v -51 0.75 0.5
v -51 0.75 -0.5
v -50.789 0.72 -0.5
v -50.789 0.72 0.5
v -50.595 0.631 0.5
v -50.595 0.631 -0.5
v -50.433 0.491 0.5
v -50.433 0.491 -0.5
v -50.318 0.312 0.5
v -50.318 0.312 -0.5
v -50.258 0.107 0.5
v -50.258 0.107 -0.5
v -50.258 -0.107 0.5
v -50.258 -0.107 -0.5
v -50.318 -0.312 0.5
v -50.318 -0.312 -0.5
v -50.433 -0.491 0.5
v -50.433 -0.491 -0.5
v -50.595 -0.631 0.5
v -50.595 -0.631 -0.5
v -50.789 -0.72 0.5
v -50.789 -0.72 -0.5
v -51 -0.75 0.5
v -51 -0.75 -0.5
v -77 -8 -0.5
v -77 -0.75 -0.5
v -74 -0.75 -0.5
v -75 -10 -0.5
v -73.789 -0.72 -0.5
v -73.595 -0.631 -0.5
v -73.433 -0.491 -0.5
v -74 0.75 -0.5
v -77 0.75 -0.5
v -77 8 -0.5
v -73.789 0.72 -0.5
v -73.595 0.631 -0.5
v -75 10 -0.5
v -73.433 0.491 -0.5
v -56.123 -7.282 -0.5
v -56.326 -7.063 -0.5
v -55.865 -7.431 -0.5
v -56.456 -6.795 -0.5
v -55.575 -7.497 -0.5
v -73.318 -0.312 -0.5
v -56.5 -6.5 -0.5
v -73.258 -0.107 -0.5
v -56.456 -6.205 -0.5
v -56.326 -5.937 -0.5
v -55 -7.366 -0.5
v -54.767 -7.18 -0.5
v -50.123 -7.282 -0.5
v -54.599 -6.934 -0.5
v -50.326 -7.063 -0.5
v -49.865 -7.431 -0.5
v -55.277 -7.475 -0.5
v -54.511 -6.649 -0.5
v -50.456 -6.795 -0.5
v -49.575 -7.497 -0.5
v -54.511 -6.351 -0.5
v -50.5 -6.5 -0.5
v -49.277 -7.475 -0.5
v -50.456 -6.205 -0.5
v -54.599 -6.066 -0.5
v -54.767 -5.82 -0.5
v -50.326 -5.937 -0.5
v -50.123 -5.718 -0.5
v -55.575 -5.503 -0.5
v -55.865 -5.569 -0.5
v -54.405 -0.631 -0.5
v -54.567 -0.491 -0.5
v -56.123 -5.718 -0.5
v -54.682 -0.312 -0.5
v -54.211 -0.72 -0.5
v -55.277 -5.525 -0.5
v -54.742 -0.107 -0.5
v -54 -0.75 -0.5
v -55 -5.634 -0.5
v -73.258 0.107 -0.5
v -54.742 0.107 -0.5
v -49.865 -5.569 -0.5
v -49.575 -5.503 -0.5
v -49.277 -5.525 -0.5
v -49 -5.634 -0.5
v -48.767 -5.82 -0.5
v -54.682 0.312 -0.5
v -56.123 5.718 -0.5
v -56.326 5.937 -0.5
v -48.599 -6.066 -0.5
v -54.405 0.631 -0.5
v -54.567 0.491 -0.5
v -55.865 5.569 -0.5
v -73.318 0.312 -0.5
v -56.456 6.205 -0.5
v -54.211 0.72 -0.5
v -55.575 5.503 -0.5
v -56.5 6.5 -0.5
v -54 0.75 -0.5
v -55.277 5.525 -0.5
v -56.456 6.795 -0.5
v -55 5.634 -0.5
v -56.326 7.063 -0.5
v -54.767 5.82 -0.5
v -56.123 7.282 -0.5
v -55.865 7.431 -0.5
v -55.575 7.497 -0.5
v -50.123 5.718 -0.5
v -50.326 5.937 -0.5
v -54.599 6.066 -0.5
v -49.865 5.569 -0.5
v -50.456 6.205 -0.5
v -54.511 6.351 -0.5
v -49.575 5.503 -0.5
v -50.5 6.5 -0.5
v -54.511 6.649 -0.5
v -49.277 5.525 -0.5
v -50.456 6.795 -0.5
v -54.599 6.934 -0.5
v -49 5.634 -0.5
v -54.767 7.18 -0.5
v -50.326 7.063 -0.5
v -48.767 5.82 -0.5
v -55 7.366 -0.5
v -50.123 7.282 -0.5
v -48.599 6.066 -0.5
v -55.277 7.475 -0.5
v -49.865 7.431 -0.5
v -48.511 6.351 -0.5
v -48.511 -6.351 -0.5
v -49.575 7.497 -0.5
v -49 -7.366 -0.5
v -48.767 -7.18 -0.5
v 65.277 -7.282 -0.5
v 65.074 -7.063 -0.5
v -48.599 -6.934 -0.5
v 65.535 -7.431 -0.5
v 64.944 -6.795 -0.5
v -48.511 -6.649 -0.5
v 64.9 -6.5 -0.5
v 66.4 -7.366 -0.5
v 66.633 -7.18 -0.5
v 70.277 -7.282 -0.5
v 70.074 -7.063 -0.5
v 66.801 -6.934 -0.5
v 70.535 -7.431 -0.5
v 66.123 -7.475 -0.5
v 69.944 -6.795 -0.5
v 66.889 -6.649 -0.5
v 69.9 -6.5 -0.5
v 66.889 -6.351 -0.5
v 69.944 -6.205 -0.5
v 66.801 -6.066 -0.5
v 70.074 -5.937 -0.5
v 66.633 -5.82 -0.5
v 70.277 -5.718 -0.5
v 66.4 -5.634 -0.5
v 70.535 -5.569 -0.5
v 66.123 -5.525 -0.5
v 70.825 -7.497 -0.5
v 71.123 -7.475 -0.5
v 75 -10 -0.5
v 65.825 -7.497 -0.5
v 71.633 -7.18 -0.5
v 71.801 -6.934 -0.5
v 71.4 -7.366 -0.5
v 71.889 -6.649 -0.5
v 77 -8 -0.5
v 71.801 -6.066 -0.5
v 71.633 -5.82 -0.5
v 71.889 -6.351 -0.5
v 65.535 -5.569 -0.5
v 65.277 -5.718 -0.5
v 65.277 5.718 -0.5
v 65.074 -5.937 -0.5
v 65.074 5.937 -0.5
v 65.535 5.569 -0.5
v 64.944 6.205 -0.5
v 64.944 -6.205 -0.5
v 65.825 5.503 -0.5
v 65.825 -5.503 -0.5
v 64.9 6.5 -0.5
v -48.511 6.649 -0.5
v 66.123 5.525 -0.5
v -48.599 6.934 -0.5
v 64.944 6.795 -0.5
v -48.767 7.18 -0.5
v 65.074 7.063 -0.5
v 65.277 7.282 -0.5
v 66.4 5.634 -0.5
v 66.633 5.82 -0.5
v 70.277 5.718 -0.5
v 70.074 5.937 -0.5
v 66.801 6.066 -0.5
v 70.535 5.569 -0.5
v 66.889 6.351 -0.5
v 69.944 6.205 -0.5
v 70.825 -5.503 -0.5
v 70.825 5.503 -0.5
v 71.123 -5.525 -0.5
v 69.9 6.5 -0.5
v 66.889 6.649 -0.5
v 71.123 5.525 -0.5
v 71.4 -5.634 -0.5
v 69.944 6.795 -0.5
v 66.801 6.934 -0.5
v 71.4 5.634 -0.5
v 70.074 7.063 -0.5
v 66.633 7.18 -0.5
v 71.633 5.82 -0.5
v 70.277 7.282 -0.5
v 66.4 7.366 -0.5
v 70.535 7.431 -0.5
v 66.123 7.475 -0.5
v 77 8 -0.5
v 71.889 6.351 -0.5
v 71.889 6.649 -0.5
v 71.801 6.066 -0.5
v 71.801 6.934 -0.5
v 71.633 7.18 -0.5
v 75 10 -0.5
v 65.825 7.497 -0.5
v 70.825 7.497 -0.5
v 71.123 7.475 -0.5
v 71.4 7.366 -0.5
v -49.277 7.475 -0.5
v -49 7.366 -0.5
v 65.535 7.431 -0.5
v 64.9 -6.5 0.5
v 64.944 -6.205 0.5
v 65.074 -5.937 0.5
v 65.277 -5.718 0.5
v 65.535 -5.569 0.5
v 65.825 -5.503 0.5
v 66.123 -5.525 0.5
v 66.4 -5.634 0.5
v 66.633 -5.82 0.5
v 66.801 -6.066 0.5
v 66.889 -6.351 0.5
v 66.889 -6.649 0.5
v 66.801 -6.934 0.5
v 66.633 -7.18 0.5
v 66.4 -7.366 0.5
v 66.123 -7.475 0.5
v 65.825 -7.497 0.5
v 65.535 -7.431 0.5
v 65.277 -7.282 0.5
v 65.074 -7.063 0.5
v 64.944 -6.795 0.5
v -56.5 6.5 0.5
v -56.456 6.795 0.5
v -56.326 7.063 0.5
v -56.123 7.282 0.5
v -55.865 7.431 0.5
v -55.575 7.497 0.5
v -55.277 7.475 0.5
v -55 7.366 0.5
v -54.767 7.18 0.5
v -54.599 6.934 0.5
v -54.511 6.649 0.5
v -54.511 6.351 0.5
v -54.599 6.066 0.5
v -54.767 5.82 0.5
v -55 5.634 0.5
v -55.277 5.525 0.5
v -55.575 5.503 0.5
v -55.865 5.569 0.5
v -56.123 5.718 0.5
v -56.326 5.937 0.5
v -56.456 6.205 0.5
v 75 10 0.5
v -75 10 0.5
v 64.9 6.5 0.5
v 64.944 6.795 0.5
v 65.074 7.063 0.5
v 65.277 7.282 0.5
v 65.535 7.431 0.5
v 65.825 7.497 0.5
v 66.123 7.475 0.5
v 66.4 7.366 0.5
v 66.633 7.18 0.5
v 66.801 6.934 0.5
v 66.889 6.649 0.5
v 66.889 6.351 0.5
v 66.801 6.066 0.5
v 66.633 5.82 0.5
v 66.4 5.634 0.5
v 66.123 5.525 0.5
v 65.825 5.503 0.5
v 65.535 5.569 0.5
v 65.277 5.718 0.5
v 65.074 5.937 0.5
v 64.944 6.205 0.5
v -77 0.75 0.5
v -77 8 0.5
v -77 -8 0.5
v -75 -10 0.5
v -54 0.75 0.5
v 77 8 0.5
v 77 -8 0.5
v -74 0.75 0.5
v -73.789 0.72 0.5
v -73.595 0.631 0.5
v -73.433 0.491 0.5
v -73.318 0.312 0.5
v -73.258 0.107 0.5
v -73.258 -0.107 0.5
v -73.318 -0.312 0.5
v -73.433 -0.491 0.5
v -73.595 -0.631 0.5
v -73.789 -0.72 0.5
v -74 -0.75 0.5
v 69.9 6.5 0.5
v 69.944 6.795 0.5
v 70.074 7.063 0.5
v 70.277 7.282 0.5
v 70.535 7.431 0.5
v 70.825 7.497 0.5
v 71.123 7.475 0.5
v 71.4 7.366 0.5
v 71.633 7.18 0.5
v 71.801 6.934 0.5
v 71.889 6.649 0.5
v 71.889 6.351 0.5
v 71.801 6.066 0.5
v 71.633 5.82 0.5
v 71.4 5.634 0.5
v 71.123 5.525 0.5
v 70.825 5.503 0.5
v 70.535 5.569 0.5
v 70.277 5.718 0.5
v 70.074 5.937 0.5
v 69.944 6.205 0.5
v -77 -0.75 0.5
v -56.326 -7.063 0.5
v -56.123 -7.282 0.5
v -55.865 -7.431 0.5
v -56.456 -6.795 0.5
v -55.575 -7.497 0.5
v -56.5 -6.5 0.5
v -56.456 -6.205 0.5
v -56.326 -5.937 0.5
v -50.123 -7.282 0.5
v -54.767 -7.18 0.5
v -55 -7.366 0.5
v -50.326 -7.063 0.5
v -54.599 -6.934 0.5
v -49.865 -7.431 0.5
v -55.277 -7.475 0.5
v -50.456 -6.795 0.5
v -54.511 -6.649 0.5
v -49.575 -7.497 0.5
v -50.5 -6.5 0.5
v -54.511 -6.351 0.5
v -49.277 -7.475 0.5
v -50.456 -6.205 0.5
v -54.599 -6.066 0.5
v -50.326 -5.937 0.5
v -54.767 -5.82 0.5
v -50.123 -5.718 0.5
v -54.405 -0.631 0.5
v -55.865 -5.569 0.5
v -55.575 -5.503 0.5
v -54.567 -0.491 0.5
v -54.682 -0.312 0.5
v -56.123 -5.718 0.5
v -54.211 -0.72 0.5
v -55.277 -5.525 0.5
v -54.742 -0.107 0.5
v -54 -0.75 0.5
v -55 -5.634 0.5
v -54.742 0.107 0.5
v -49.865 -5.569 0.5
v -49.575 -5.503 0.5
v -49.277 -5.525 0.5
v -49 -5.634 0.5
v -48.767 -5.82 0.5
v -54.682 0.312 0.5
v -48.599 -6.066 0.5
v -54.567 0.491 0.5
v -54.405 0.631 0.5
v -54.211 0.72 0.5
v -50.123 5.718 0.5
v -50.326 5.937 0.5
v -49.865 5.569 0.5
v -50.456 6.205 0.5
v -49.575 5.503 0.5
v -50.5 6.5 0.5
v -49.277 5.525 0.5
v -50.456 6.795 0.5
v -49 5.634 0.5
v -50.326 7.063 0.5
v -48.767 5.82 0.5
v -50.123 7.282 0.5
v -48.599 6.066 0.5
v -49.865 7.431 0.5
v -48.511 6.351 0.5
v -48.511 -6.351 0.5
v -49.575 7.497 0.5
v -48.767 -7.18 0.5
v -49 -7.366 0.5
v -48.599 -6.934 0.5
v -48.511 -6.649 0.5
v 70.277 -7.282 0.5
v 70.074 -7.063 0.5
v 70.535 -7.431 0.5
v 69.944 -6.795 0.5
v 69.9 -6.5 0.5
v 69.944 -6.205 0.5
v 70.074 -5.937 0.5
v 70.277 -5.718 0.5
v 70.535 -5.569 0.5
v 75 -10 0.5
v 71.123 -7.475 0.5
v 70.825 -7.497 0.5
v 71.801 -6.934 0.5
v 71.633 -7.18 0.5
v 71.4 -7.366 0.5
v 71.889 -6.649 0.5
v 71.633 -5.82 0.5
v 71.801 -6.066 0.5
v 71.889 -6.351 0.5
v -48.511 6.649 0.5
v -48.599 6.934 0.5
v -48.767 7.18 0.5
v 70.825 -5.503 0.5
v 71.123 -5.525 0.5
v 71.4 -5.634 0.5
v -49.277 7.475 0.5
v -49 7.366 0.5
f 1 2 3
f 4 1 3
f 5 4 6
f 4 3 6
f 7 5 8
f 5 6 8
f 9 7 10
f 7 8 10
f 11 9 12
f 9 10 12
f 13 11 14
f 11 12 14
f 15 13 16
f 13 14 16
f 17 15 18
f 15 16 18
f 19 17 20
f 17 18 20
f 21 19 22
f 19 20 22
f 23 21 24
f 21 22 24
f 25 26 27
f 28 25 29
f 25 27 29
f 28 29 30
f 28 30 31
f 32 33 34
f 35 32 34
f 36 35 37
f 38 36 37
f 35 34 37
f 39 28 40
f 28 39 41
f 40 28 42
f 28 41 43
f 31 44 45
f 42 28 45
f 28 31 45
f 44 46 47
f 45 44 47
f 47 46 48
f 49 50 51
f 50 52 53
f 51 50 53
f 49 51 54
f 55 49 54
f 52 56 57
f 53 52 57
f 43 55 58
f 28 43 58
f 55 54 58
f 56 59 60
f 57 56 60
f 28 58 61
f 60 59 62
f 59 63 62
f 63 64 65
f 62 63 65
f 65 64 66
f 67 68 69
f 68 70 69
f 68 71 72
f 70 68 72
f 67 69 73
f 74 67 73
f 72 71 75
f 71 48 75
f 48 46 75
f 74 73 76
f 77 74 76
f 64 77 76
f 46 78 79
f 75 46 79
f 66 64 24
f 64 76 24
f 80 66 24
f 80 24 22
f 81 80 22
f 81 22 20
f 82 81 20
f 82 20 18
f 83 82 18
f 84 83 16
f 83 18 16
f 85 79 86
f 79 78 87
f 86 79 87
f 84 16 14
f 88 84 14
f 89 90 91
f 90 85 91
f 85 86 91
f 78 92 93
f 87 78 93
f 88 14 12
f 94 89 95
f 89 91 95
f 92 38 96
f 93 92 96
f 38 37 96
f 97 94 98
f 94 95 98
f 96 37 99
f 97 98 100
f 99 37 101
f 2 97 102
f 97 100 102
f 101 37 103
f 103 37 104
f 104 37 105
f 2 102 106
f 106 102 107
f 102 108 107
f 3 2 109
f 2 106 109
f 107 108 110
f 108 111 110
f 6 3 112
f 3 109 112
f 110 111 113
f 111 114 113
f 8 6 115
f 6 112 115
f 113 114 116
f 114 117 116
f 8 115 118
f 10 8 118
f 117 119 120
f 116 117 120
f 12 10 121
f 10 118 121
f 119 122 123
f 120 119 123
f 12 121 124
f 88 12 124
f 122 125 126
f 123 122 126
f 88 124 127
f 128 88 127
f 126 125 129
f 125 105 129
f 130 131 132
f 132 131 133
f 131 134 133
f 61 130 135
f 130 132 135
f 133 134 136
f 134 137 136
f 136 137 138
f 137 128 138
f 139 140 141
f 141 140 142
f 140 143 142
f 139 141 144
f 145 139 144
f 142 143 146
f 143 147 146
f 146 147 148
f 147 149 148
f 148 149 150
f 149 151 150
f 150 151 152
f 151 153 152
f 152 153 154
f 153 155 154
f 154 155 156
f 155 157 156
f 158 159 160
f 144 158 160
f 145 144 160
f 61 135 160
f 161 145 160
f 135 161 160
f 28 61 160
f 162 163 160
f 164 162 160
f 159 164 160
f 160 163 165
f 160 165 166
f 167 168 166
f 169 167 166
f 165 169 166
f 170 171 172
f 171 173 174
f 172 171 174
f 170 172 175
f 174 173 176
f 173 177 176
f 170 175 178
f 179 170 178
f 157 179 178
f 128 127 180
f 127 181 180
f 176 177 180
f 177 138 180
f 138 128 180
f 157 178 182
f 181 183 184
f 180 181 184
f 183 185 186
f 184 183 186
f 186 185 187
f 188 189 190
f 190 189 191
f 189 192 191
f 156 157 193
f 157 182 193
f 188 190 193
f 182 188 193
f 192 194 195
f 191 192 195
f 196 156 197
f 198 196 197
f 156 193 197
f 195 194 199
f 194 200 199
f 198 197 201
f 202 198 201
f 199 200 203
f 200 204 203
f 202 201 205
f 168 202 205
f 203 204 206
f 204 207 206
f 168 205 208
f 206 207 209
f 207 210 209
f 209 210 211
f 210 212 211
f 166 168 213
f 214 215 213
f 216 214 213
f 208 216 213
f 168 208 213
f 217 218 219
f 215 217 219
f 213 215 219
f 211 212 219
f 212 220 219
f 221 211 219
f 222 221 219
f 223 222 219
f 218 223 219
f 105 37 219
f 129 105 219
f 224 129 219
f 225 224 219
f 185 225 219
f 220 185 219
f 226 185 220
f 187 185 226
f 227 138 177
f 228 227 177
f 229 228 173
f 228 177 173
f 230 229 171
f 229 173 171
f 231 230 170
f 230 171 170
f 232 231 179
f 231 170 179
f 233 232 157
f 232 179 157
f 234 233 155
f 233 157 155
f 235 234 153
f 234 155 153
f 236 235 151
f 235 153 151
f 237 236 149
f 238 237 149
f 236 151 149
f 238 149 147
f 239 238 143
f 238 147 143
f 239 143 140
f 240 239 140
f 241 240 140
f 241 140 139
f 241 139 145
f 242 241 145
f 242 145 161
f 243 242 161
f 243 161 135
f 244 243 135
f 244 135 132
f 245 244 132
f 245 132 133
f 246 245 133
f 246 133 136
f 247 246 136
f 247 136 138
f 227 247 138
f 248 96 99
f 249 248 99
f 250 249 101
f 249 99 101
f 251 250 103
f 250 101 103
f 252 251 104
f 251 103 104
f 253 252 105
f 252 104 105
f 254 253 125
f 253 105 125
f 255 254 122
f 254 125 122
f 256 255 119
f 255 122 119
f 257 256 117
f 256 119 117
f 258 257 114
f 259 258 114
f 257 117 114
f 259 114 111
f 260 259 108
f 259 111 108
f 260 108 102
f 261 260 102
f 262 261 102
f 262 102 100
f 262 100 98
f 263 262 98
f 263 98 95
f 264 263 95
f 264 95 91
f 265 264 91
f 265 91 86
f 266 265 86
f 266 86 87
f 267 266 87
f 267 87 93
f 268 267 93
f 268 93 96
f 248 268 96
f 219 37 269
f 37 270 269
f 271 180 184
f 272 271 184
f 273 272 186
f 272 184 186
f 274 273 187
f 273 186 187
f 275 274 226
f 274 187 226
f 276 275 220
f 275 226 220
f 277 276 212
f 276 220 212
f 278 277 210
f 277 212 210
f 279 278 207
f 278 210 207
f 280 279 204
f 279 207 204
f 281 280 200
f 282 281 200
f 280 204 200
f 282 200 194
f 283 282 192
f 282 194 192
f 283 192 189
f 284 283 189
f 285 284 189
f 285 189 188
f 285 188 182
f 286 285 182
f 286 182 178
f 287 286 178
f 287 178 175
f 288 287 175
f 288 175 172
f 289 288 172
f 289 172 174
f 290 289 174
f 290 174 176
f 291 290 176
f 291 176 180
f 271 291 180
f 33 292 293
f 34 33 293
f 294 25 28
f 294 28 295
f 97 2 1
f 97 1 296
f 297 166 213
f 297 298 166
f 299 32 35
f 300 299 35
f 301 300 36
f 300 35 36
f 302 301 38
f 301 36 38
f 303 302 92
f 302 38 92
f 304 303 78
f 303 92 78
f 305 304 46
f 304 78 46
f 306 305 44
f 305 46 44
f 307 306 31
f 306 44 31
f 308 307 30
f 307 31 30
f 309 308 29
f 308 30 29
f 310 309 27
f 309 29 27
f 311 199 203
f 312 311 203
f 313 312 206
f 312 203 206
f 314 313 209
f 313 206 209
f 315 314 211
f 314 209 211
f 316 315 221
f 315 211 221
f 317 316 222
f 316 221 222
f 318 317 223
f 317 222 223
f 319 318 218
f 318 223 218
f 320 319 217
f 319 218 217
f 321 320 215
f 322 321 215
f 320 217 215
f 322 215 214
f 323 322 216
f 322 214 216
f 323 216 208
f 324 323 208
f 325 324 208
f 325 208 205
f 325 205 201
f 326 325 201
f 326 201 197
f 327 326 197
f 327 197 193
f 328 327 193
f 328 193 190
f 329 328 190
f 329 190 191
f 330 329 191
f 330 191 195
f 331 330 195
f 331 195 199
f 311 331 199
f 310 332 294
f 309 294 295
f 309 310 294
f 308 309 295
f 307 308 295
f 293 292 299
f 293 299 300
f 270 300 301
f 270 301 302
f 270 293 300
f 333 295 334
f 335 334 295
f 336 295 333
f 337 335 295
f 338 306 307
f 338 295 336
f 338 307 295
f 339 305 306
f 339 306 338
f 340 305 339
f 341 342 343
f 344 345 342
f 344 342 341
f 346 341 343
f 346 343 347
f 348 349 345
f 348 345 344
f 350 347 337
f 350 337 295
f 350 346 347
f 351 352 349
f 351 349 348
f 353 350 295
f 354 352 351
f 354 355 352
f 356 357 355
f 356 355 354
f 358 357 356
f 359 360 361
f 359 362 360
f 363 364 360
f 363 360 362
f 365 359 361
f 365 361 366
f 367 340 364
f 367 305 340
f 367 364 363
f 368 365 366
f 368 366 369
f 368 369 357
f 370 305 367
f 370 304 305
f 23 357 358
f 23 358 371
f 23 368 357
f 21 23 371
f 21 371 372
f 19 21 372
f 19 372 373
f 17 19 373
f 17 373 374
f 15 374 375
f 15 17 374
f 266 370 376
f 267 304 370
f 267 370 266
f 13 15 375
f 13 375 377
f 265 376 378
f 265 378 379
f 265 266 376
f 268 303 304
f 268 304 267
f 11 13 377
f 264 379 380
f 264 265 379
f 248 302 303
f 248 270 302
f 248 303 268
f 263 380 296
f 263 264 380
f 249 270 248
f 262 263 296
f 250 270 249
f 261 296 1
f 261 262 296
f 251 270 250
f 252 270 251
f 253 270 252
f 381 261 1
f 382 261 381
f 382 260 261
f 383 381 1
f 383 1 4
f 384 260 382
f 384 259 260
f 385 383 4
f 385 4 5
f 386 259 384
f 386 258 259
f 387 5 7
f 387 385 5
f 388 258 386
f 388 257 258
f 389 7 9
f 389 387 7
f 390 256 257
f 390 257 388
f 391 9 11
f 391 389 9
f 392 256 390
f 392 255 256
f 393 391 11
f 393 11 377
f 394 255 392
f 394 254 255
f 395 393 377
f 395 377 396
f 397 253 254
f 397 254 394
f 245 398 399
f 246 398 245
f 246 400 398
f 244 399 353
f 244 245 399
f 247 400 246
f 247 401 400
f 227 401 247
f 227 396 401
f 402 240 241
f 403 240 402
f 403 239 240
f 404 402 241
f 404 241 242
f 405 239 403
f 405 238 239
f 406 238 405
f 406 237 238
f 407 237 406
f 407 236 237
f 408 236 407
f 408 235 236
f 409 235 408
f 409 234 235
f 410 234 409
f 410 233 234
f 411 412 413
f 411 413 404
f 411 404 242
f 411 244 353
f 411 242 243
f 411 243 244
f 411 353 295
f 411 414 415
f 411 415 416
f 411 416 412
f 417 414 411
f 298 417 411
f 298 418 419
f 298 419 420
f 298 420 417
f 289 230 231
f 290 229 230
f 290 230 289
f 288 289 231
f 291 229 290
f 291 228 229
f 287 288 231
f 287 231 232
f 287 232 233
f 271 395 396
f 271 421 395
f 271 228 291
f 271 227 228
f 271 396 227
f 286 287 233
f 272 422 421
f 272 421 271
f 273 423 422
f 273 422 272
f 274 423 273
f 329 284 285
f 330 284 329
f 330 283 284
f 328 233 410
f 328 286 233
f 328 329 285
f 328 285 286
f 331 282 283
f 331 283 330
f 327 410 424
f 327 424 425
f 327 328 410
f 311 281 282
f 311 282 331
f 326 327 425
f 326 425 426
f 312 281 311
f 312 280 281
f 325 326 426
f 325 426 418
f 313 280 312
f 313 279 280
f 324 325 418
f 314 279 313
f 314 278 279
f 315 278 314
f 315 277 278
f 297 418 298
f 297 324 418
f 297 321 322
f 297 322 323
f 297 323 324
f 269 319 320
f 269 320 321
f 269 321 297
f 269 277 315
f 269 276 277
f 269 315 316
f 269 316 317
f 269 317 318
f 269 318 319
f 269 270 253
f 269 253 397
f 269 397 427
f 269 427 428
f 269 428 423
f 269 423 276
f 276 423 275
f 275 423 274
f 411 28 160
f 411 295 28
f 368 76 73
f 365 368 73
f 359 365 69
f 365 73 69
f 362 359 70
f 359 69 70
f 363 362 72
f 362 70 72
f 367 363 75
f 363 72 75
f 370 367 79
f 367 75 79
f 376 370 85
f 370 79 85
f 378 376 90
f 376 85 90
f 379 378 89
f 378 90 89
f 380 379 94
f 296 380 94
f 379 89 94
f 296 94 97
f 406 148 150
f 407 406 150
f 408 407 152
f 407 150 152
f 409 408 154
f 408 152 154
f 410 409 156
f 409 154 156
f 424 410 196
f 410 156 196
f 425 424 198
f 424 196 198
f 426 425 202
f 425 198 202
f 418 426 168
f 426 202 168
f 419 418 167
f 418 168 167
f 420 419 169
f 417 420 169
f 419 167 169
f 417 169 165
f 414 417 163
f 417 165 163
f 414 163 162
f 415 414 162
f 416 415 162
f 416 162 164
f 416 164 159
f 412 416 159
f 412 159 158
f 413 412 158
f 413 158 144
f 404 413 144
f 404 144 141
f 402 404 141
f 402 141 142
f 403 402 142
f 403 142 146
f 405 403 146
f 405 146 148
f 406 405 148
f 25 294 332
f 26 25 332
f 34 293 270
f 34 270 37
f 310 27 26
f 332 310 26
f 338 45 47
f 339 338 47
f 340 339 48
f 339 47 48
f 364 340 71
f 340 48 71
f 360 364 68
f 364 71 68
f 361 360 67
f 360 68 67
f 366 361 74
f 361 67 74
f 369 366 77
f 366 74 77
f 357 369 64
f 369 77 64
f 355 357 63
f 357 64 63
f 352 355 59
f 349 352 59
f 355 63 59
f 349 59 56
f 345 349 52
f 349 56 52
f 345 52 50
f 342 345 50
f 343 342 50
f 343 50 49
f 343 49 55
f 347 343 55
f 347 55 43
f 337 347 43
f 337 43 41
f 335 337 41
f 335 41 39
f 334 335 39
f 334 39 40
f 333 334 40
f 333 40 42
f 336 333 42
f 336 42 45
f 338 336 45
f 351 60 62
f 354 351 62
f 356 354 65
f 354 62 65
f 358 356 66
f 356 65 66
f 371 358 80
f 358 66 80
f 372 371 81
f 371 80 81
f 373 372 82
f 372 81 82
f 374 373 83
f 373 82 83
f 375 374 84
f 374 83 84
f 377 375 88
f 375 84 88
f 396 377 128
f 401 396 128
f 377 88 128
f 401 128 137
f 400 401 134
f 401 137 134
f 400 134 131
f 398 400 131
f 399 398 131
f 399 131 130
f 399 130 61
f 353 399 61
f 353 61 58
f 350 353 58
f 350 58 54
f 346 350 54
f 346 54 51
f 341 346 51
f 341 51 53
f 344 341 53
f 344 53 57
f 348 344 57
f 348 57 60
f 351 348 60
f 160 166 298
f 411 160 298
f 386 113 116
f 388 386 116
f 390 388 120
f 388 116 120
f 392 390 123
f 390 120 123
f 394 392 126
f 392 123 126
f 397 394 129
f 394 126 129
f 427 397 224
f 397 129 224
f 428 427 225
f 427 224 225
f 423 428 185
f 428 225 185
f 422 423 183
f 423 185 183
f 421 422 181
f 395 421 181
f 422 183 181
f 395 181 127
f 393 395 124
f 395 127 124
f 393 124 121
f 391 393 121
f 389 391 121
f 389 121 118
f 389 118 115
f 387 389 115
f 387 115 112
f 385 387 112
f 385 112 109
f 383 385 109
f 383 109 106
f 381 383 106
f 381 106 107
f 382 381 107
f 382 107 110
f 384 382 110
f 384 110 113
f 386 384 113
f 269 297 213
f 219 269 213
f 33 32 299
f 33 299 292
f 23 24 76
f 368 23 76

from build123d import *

# Parameters (mm, degrees)
SKETCH_1_W          = 154
SKETCH_1_H          = 20
EXTRUDE_1_DEPTH     = 0.5
CHAMFER_1_SIZE      = 2
SKETCH_2_R          = 1
CUT_EXTRUDE_1_DEPTH = 2
SKETCH_3_R          = 1
CUT_EXTRUDE_2_DEPTH = 2
SKETCH_4_W          = 3
SKETCH_4_H          = 1.5
CUT_EXTRUDE_3_DEPTH = 2
SKETCH_5_R          = 0.75
CUT_EXTRUDE_4_DEPTH = 2


with BuildPart() as part:
    # 草图1 → 凸台-拉伸1 (new body, symmetric)
    with BuildSketch(Plane.XY):
        Rectangle(SKETCH_1_W, SKETCH_1_H)
    extrude(amount=EXTRUDE_1_DEPTH, both=True)

    # 倒角1
    chamfer_1_edges = [part.edges().sort_by_distance(p)[0] for p in [
        (-77, 10, 0),
        (77, 10, 0),
        (77, -10, 0),
        (-77, -10, 0),
    ]]
    chamfer(chamfer_1_edges, length=CHAMFER_1_SIZE)

    # 草图2 → 切除-拉伸1 (cut, through all)
    with BuildSketch(Plane(origin=(0, 0, -0.5), x_dir=(-1, 0, 0), z_dir=(0, 0, -1))):
        with Locations((-70.9, -6.5)):
            Circle(SKETCH_2_R)
        with Locations((-65.9, -6.5)):
            Circle(SKETCH_2_R)
        with Locations((-65.9, 6.5)):
            Circle(SKETCH_2_R)
        with Locations((-70.9, 6.5)):
            Circle(SKETCH_2_R)
    extrude(amount=-CUT_EXTRUDE_1_DEPTH, mode=Mode.SUBTRACT)

    # 草图3 → 切除-拉伸2 (cut, through all)
    with BuildSketch(Plane(origin=(0, 0, -0.5), x_dir=(-1, 0, 0), z_dir=(0, 0, -1))):
        with Locations((55.5, 6.5)):
            Circle(SKETCH_3_R)
        with Locations((49.5, 6.5)):
            Circle(SKETCH_3_R)
        with Locations((55.5, -6.5)):
            Circle(SKETCH_3_R)
        with Locations((49.5, -6.5)):
            Circle(SKETCH_3_R)
    extrude(amount=-CUT_EXTRUDE_2_DEPTH, mode=Mode.SUBTRACT)

    # 草图4 → 切除-拉伸3 (cut, through all)
    with BuildSketch(Plane(origin=(0, 0, -0.5), x_dir=(-1, 0, 0), z_dir=(0, 0, -1))):
        with Locations((52.5, 0)):
            Rectangle(SKETCH_4_W, SKETCH_4_H)
        with Locations((75.5, 0)):
            Rectangle(SKETCH_4_W, SKETCH_4_H)
    extrude(amount=-CUT_EXTRUDE_3_DEPTH, mode=Mode.SUBTRACT)

    # 草图5 → 切除-拉伸4 (cut, through all)
    with BuildSketch(Plane(origin=(0, 0, -0.5), x_dir=(-1, 0, 0), z_dir=(0, 0, -1))):
        with Locations((51, 0)):
            Circle(SKETCH_5_R)
        with Locations((54, 0)):
            Circle(SKETCH_5_R)
        with Locations((74, 0)):
            Circle(SKETCH_5_R)
    extrude(amount=-CUT_EXTRUDE_4_DEPTH, mode=Mode.SUBTRACT)


solid = part.part
